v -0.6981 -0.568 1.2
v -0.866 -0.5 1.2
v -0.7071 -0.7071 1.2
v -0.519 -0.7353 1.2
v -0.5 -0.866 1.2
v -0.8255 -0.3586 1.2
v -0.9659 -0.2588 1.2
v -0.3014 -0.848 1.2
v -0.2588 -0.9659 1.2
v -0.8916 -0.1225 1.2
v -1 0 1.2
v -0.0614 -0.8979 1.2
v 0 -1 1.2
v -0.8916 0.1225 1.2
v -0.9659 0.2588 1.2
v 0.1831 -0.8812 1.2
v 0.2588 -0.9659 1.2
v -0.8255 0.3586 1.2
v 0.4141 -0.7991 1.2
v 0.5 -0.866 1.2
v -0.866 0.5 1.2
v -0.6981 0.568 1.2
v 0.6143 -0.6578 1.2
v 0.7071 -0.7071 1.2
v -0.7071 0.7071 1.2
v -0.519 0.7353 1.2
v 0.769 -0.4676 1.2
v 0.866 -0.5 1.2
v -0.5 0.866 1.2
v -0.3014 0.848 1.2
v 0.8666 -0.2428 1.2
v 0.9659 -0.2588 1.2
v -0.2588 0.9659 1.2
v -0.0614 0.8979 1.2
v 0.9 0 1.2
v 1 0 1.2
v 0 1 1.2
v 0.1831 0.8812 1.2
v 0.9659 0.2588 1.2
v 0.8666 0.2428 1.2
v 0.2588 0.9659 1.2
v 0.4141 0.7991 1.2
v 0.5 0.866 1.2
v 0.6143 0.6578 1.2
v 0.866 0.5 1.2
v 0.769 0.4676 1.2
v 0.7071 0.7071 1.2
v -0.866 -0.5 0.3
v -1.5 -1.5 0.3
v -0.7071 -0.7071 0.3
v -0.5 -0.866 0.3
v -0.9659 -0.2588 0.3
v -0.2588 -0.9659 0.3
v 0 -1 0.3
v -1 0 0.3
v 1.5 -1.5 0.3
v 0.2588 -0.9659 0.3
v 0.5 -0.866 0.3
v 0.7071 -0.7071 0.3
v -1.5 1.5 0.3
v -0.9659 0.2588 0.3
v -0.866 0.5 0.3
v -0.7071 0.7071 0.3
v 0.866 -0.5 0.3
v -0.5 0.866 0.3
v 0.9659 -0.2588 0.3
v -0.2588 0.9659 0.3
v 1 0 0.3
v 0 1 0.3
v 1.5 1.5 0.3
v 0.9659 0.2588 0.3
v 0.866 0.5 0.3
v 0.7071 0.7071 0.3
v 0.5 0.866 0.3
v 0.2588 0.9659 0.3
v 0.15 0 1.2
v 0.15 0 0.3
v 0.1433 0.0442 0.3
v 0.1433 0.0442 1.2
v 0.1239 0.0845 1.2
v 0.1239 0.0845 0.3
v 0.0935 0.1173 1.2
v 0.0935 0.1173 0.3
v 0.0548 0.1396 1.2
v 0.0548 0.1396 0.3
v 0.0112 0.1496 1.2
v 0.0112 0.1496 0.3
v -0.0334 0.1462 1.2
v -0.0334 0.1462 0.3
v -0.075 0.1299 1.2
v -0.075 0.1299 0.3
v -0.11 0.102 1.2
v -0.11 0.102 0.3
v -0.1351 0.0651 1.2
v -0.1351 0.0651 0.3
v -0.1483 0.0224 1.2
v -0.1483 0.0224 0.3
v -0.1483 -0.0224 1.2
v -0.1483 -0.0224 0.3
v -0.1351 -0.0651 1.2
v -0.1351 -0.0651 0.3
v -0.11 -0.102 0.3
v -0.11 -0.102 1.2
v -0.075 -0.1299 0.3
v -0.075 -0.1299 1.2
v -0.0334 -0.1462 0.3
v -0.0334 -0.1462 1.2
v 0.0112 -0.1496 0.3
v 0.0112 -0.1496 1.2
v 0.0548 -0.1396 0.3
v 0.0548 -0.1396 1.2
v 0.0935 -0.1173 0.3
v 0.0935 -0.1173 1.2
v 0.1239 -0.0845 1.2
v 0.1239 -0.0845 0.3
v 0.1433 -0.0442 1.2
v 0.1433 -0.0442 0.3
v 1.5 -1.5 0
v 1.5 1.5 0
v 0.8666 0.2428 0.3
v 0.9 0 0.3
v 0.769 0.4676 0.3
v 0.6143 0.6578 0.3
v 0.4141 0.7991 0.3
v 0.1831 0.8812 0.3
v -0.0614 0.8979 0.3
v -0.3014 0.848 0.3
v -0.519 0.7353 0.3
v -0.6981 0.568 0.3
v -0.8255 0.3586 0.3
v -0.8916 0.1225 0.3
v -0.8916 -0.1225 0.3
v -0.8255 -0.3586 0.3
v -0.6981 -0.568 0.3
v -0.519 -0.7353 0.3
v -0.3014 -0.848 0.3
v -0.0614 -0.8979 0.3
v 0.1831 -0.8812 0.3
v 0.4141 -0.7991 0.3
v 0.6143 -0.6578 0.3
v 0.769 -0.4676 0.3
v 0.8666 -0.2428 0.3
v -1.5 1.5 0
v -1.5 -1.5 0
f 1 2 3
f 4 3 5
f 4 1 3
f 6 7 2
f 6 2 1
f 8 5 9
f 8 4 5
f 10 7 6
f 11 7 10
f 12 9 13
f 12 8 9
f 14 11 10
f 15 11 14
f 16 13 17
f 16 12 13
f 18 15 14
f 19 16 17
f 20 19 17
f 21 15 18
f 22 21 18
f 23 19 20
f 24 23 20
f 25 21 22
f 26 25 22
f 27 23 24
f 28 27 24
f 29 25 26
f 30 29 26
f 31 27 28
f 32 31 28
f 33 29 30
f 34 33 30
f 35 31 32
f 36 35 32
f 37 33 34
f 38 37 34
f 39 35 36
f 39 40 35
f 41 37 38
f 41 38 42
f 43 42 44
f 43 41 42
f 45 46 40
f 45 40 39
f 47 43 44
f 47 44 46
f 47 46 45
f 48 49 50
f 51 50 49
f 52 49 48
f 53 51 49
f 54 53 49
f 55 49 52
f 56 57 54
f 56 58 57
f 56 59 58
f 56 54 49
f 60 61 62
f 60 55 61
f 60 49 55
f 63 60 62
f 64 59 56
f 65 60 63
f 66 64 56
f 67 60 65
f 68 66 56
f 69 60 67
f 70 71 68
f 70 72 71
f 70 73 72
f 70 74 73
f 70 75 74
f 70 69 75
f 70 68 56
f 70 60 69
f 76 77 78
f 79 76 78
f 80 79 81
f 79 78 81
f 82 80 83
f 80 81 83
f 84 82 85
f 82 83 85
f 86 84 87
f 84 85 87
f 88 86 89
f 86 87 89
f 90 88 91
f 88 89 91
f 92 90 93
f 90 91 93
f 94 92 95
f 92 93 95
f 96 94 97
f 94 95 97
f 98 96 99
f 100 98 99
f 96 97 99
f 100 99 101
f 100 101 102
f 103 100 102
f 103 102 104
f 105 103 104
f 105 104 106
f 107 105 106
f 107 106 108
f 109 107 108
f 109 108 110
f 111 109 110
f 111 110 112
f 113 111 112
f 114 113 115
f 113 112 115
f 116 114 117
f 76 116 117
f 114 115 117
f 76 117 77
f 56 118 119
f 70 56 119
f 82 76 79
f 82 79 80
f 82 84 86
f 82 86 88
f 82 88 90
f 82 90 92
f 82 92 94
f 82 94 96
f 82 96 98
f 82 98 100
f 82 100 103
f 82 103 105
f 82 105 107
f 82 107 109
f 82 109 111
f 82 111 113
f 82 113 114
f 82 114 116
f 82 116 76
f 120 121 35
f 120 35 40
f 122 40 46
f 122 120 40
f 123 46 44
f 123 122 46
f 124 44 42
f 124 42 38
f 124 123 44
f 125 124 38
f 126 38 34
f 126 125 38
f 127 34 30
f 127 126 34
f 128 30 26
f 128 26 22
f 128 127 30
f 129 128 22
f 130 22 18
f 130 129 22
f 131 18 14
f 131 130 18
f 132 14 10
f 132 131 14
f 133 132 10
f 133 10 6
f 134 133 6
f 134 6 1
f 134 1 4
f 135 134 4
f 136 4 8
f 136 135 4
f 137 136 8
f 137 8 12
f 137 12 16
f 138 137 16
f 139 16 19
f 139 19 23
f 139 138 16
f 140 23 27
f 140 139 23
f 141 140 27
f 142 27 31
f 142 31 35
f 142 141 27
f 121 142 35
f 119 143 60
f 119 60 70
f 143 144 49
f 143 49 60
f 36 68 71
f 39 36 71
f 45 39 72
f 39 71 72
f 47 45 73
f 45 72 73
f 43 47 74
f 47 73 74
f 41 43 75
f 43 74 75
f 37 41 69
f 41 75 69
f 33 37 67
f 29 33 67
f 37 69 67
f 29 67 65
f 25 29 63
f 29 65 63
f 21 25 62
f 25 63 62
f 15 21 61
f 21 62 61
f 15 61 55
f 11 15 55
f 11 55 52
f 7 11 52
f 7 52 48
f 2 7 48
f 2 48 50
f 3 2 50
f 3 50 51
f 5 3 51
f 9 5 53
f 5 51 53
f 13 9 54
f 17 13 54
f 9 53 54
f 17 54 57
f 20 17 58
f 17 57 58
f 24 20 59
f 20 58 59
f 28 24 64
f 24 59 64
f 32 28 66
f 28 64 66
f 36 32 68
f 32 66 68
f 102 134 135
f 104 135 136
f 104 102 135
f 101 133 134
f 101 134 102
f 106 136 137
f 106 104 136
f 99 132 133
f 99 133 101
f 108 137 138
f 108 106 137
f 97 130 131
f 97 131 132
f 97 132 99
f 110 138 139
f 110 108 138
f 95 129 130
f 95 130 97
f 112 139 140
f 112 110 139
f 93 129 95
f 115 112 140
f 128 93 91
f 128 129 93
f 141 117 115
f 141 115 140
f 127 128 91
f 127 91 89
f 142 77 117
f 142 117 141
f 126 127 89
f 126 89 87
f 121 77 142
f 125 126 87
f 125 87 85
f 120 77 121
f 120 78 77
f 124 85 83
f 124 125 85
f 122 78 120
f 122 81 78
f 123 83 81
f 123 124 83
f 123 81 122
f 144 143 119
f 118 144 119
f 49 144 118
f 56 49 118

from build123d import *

# Parameters (mm, degrees)
CROQUIS1_W              = 3
CROQUIS1_H              = 3
SALIENTE_EXTRUIR1_DEPTH = 0.3
CROQUIS2_R              = 1
CROQUIS2_R_2            = 0.9
CROQUIS2_R_3            = 0.15
SALIENTE_EXTRUIR2_DEPTH = 0.9


with BuildPart() as part:
    # Croquis1 → Saliente-Extruir1 (new body)
    with BuildSketch(Plane.XY):
        Rectangle(CROQUIS1_W, CROQUIS1_H)
    extrude(amount=SALIENTE_EXTRUIR1_DEPTH)

    # Croquis2 → Saliente-Extruir2 (add)
    # profile 1 of 2: a face of its own
    with BuildSketch(Plane.XY.offset(0.3)):
        Circle(CROQUIS2_R)
        Circle(CROQUIS2_R_2, mode=Mode.SUBTRACT)
    # profile 2 of 2: a face of its own
    with BuildSketch(Plane.XY.offset(0.3)):
        Circle(CROQUIS2_R_3)
    extrude(amount=SALIENTE_EXTRUIR2_DEPTH)


solid = part.part
